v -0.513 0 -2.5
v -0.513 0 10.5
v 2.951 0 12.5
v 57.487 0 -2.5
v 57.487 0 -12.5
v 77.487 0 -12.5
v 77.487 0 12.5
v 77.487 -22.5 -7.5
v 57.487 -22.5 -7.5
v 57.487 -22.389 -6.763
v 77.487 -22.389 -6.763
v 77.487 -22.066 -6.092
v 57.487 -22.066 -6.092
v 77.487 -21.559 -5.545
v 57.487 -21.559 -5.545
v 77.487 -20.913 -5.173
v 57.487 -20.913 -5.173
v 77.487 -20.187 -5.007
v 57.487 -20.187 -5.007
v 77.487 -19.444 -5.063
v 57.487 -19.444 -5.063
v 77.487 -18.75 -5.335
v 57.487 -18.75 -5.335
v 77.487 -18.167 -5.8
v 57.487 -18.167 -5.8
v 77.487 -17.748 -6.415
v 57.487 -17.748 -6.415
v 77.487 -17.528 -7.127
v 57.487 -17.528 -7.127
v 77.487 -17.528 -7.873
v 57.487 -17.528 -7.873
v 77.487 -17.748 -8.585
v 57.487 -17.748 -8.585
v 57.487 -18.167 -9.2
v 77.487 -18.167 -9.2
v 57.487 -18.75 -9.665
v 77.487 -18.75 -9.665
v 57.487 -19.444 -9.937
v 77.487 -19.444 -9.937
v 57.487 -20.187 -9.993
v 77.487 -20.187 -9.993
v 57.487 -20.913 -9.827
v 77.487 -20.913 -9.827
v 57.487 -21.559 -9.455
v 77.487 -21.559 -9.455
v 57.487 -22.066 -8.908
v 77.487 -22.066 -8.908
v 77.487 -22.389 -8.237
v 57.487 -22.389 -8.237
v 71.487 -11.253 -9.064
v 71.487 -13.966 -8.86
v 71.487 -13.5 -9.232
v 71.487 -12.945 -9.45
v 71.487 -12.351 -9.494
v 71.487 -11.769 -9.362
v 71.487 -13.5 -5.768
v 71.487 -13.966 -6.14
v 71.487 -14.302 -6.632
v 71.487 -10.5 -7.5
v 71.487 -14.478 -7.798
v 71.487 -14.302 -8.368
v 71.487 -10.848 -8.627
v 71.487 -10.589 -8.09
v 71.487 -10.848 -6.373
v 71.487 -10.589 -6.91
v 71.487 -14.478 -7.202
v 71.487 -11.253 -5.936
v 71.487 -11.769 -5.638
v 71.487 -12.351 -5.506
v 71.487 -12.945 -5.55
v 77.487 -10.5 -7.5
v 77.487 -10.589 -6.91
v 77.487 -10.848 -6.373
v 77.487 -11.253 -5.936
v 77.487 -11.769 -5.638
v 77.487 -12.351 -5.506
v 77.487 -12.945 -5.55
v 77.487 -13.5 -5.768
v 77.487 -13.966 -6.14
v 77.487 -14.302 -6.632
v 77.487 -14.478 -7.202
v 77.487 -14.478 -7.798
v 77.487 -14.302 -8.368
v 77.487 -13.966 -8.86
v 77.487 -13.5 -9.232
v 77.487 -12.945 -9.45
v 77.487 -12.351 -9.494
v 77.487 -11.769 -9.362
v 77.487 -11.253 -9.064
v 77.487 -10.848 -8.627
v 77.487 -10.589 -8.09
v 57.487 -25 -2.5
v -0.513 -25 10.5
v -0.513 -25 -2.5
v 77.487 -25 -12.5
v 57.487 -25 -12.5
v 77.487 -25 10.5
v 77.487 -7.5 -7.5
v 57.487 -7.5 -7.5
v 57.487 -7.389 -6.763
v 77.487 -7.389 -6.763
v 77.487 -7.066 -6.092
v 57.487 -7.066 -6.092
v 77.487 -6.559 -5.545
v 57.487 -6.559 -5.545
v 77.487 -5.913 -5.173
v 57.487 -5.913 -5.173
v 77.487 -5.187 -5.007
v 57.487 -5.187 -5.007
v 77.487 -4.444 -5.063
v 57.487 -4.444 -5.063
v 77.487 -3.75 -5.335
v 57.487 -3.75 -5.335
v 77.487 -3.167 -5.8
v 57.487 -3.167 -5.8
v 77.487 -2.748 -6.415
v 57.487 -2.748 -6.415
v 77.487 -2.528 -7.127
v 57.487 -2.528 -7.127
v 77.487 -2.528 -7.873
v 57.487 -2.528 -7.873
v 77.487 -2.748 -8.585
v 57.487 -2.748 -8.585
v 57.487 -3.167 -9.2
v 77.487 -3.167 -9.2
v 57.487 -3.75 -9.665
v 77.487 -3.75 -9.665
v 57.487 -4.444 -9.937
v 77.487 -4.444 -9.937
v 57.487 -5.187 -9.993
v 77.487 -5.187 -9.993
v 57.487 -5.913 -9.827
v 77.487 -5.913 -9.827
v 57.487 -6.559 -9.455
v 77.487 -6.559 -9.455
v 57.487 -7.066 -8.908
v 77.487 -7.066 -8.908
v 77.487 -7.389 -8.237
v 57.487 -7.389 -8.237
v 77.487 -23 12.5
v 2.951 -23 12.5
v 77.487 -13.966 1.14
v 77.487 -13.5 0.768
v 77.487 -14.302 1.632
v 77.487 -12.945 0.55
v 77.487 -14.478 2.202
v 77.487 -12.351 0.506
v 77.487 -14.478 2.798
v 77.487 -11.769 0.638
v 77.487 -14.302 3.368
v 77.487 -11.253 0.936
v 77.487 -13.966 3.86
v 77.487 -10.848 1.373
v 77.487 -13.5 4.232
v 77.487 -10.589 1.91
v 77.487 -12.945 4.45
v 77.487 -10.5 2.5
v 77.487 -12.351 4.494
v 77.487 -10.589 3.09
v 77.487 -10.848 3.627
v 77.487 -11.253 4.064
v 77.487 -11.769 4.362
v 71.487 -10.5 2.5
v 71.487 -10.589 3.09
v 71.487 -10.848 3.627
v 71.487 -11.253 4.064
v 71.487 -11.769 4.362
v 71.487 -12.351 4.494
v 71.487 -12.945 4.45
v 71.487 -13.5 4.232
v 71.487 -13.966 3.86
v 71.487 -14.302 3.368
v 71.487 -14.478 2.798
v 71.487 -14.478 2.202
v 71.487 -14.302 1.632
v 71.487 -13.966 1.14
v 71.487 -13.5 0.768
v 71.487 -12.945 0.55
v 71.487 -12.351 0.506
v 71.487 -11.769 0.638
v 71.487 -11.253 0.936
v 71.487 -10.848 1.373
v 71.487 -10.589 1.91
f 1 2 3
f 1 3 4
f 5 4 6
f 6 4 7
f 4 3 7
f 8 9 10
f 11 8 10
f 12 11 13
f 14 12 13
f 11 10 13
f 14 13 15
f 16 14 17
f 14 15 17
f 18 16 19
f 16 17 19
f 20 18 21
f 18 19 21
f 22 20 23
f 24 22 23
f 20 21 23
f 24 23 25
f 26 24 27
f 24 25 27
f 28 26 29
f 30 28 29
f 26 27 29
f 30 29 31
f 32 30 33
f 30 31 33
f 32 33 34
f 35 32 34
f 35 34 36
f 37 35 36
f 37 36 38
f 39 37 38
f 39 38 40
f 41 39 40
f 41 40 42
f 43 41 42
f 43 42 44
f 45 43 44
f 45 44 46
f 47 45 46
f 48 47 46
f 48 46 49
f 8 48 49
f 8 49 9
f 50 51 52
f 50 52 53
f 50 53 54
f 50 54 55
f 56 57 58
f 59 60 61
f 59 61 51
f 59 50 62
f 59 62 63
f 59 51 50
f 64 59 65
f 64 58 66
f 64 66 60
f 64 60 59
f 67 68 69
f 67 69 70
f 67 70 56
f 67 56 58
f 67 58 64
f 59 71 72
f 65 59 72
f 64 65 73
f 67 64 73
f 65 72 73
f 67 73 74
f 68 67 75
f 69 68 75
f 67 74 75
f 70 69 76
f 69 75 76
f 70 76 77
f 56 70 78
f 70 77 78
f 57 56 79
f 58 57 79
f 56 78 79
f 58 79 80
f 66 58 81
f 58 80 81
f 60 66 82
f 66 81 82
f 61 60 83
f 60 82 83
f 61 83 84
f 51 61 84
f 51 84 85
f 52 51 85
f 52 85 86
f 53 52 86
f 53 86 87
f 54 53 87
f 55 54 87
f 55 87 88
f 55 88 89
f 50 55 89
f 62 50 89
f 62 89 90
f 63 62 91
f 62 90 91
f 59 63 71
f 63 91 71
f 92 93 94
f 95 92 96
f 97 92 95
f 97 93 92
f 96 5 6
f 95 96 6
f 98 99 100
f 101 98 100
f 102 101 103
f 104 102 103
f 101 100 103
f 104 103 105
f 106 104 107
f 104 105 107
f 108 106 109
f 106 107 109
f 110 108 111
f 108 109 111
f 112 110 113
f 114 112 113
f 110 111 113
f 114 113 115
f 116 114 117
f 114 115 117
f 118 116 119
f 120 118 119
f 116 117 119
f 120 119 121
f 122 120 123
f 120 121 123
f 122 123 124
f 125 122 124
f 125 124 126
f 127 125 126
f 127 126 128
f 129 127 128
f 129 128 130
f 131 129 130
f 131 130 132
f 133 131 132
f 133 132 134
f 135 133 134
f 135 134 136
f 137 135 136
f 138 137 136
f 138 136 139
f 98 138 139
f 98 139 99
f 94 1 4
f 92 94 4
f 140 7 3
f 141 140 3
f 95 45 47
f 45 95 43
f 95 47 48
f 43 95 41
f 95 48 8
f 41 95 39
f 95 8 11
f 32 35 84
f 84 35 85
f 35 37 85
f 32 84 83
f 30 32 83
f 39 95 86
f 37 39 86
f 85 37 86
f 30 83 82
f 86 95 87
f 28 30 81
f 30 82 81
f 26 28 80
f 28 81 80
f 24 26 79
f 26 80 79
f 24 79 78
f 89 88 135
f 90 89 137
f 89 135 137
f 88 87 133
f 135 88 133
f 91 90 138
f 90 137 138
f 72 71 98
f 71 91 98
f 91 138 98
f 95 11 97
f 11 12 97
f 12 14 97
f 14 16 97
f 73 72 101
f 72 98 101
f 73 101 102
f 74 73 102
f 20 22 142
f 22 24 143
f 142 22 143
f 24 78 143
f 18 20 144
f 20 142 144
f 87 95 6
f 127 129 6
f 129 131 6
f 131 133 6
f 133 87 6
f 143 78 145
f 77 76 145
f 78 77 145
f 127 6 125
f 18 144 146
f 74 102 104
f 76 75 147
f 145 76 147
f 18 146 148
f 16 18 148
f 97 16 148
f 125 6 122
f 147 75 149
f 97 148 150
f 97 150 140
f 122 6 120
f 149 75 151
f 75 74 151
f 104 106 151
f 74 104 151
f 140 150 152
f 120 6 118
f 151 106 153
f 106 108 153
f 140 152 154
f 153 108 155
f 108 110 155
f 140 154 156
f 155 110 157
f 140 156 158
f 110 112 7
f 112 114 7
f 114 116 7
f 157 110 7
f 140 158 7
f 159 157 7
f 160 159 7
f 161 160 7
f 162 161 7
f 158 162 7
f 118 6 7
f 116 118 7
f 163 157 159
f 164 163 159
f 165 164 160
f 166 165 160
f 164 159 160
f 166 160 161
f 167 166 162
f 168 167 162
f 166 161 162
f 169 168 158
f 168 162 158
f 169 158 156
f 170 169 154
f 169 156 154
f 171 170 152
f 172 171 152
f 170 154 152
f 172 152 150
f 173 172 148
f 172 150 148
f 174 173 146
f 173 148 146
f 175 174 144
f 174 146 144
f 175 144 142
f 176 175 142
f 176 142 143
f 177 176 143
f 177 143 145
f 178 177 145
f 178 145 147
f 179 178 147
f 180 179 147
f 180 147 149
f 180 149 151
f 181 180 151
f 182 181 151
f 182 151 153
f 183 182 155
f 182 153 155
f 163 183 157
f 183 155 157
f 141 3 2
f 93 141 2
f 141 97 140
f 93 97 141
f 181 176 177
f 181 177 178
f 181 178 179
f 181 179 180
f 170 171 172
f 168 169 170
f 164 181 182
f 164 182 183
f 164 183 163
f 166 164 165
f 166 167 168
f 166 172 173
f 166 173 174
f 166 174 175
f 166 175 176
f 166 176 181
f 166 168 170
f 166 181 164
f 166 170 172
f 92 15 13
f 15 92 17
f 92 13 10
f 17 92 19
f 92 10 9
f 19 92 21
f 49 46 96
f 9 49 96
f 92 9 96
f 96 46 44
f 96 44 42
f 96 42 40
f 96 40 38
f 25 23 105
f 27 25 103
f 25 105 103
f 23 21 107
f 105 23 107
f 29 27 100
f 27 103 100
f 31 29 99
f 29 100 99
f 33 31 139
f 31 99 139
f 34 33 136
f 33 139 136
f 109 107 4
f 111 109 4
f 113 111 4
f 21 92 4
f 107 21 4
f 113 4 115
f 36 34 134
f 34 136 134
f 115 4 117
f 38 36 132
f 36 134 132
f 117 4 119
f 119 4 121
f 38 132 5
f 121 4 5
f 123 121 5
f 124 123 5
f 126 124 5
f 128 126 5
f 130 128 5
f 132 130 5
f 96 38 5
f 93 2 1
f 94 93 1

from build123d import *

# Parameters (mm, degrees)
F0_W     = 6
F0_H     = 2
F0_W_2   = 20
F0_H_2   = 5
F1_DEPTH = 25
F2_R     = 2.5
F3_DEPTH = 20.001
F4_R     = 2
F5_DEPTH = 6
F6_SIZE  = 2


with BuildPart() as f1:
    # F0 (on Front) → F1 (new body)
    with BuildSketch(Plane.XZ):
        with Locations((74.487355, 1.5)):
            Rectangle(F0_W, F0_H)
        Polygon((2.951456, 12.5), (-0.512645, 10.5), (77.487355, 10.5), (77.487355, 12.5), align=None)
        with Locations((67.487355, -10)):
            Rectangle(F0_W_2, F0_H_2)
        with Locations((74.487355, 3.5)):
            Rectangle(F0_W, F0_H)
        Polygon((77.487355, 10.5), (-0.512645, 10.5), (-0.512645, -2.5), (57.487355, -2.5), (57.487355, -7.5), (77.487355, -7.5), (77.487355, 0.5), (71.487355, 0.5), (70.332654, 2.5), (71.487355, 4.5), (77.487355, 4.5), align=None)
        Polygon((71.487355, 2.5), (70.332654, 2.5), (71.487355, 0.5), align=None)
        Polygon((71.487355, 2.5), (71.487355, 4.5), (70.332654, 2.5), align=None)
    extrude(amount=F1_DEPTH)

    # F2 (on face) → F3 (cut, through all)
    with BuildSketch(Plane(origin=(57.487355, 0, 0), x_dir=(0, -1, 0), z_dir=(-1, 0, 0))):
        with Locations((20, -7.5)):
            Circle(F2_R)
        with Locations((5, -7.5)):
            Circle(F2_R)
    extrude(amount=-F3_DEPTH, mode=Mode.SUBTRACT)

    # F4 (on face) → F5 (cut)
    with BuildSketch(Plane.YZ.offset(77.487355)):
        with Locations((-12.5, 2.5)):
            Circle(F4_R)
        with Locations((-12.5, -7.5)):
            Circle(F4_R)
    extrude(amount=-F5_DEPTH, mode=Mode.SUBTRACT)

    # F6
    f6_edges = [f1.edges().sort_by_distance(p)[0] for p in [
        (40.219405, -25, 12.5),
    ]]
    chamfer(f6_edges, length=F6_SIZE)


solid = f1.part
